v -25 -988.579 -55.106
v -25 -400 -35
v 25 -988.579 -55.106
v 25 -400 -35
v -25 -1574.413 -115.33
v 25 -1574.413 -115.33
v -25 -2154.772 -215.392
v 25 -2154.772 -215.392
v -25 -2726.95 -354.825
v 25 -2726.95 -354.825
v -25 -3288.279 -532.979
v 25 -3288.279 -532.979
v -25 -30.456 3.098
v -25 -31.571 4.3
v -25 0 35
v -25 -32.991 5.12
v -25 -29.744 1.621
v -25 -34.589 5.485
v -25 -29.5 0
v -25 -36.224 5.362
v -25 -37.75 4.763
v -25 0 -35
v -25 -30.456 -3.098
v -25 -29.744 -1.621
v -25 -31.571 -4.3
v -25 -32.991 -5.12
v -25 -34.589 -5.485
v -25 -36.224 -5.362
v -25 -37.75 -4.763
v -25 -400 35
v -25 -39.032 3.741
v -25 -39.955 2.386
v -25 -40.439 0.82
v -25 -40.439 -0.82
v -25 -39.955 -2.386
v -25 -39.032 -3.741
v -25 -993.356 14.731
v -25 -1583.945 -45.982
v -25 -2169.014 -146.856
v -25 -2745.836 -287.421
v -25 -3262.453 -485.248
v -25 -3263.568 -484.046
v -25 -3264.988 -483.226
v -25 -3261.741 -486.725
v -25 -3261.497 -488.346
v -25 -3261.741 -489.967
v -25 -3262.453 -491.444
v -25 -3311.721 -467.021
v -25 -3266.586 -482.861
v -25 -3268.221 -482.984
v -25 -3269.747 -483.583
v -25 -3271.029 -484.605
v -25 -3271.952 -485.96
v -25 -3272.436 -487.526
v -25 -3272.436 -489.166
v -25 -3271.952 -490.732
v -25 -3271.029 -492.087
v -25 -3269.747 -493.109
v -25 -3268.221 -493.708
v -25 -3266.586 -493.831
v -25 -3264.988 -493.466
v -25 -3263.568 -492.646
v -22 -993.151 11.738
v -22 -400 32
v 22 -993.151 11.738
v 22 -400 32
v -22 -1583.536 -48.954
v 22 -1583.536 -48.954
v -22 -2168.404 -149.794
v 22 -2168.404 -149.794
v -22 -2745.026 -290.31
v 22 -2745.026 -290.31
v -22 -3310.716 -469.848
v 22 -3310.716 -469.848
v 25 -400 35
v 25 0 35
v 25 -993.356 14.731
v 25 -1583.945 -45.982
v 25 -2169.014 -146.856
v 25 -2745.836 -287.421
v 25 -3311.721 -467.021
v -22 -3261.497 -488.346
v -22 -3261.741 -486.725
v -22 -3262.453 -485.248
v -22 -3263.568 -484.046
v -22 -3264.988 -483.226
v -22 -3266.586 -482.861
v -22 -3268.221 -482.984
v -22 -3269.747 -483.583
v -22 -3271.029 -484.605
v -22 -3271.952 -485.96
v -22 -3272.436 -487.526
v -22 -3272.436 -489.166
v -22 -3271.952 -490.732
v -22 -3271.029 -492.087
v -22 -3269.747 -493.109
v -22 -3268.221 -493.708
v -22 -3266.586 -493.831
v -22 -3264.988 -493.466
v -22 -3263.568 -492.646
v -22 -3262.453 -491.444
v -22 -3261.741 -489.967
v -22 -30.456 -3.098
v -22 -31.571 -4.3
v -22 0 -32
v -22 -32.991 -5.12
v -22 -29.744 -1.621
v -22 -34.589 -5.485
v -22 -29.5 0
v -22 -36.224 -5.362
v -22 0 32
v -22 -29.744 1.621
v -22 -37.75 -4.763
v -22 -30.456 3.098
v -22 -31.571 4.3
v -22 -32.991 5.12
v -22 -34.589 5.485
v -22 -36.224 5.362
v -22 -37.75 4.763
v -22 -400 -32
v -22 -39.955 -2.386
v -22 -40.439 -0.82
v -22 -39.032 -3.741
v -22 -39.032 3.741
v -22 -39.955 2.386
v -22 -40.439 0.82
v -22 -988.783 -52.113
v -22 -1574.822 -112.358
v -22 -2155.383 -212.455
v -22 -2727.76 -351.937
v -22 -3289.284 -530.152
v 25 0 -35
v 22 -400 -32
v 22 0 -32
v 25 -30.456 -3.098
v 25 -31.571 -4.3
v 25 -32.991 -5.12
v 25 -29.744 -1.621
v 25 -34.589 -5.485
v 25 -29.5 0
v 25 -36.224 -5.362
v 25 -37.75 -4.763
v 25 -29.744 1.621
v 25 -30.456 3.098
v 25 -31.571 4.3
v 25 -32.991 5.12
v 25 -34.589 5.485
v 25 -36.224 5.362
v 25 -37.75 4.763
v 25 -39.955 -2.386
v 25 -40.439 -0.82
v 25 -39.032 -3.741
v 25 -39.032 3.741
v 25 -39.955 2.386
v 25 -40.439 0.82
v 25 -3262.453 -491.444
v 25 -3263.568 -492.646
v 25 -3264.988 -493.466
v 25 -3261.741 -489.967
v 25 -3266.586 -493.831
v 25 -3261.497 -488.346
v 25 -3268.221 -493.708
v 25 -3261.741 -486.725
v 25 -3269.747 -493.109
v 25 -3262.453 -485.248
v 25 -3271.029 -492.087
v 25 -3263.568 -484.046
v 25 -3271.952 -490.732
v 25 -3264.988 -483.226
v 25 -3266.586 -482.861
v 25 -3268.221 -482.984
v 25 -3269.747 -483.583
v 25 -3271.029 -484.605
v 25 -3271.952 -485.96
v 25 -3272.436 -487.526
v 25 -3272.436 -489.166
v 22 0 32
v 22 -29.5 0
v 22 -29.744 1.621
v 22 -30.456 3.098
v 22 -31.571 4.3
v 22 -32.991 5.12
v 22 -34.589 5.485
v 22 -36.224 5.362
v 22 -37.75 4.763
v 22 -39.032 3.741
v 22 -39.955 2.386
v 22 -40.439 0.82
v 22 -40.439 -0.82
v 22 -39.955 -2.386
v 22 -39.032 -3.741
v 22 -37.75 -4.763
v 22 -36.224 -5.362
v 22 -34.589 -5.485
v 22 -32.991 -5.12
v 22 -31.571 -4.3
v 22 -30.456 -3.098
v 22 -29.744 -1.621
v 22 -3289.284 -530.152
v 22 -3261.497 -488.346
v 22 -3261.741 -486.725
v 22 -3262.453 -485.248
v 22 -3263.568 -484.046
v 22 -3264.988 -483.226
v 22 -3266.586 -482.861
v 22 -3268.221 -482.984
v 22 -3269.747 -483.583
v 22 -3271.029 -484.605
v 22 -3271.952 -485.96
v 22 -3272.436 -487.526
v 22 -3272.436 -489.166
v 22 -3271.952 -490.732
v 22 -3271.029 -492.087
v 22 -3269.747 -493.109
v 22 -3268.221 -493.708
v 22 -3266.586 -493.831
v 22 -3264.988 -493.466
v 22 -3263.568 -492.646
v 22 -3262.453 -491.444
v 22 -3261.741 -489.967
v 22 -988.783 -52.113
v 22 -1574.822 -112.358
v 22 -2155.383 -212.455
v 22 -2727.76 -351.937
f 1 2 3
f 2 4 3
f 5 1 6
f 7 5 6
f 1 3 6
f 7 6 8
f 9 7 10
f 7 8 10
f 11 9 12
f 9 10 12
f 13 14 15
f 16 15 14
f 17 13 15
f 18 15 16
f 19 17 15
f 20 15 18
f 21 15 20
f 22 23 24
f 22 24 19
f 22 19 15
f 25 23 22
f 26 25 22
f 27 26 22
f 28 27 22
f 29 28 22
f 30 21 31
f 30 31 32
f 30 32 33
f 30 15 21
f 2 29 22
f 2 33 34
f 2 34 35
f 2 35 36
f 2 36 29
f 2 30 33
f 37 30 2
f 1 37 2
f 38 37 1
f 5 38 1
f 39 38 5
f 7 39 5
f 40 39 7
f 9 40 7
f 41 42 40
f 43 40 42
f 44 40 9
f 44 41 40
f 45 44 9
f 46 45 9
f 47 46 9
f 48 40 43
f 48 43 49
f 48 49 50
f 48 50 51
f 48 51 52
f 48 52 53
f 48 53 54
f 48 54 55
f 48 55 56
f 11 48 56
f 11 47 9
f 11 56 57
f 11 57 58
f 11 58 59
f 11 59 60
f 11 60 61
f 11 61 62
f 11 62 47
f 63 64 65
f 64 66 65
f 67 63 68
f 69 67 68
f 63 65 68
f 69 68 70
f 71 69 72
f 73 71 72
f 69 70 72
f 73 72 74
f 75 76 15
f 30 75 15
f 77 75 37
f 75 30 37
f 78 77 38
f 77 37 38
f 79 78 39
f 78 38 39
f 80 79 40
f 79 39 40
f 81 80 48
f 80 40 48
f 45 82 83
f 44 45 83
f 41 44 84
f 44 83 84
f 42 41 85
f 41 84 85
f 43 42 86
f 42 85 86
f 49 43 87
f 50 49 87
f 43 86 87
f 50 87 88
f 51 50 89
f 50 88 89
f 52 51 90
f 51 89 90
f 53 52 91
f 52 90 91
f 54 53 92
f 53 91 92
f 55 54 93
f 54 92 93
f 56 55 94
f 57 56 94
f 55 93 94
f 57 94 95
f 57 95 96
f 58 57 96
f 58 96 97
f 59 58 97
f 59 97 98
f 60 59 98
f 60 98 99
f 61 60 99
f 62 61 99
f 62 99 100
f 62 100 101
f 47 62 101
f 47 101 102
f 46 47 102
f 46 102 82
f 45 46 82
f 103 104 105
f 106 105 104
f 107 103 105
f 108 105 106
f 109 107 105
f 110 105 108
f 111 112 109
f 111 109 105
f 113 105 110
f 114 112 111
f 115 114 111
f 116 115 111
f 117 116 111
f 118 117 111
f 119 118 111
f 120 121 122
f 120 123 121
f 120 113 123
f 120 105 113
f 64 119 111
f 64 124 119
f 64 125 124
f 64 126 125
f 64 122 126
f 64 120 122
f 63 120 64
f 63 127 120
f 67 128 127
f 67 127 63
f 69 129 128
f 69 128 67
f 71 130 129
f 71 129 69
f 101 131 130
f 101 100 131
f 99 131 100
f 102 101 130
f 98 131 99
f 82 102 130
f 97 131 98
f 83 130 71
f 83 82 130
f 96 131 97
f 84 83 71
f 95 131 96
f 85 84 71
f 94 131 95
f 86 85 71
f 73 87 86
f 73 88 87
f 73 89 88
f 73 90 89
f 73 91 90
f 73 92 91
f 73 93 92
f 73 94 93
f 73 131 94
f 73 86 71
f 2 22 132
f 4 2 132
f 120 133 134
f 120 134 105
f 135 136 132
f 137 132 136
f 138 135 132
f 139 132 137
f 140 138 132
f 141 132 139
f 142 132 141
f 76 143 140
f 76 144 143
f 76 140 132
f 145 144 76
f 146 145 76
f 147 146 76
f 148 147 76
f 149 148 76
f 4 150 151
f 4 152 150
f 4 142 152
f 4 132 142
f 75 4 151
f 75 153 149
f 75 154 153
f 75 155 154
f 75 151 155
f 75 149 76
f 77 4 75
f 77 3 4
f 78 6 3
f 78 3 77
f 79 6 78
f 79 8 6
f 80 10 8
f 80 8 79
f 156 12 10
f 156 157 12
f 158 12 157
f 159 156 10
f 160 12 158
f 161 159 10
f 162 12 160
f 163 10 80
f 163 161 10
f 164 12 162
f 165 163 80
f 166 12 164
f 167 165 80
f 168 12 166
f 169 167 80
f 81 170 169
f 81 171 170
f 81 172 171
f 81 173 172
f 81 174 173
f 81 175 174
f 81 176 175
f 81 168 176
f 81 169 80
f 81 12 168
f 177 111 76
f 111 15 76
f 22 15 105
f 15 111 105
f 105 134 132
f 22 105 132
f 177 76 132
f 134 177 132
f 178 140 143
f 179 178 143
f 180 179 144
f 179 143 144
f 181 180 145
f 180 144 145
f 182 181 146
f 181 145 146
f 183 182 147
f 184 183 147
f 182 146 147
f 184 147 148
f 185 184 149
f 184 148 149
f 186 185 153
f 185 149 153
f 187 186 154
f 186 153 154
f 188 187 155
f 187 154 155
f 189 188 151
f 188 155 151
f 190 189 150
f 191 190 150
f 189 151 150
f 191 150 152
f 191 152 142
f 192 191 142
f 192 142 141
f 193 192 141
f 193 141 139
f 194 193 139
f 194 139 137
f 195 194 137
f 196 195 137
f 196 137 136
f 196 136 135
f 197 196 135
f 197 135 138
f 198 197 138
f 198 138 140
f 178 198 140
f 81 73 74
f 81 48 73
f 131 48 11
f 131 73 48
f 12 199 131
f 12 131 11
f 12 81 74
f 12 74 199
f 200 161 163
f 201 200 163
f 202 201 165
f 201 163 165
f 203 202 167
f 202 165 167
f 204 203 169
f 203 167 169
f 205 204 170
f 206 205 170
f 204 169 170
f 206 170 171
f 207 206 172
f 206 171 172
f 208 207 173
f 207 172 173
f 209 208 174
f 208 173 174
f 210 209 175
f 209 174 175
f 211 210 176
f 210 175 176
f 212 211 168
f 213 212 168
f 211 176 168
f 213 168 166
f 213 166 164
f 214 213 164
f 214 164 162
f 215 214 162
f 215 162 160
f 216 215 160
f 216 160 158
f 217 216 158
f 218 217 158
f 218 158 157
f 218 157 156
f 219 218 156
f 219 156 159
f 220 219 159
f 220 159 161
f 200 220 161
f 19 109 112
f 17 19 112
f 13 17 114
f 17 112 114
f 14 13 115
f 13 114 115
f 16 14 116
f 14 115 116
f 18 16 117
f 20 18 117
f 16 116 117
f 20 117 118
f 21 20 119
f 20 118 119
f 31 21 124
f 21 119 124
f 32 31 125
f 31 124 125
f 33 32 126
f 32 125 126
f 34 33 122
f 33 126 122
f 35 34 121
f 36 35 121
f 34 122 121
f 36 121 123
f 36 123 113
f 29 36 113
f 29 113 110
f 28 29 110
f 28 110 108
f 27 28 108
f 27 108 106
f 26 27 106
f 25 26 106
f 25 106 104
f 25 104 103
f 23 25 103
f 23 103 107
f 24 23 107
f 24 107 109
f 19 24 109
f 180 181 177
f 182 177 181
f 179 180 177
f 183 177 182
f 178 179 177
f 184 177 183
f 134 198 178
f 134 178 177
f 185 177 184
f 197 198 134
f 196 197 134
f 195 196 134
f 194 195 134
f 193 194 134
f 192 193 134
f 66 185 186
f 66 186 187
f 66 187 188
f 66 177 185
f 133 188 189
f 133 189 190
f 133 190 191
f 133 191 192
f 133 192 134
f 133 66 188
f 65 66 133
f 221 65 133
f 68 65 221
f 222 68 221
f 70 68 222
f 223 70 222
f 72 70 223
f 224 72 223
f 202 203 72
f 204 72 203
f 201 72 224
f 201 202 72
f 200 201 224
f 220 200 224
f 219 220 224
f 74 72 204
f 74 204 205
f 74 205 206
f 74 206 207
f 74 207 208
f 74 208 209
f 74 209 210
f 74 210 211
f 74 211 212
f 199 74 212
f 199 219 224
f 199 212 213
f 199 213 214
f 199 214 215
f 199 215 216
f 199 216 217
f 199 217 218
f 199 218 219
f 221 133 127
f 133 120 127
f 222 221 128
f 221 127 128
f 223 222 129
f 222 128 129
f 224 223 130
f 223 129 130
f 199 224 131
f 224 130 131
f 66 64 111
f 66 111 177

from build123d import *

# Parameters (mm, degrees)
F0_W   = 50
F0_H   = 70
F0_W_2 = 44
F0_H_2 = 64
F4_D   = 11
F5_D   = 11


with BuildPart() as f2:
    # F2: sweep along a path in F1
    with BuildLine(Plane.YZ) as f2_path:
        Line((0, 0), (-400, 0))
        ThreePointArc((-400, 0), (-1871.3938969562, -125.915397654), (-3300, -500))
    # F0 (on Front) → F2 (sweep)
    with BuildSketch(Plane.XZ):
        Rectangle(F0_W, F0_H)
        Rectangle(F0_W_2, F0_H_2, mode=Mode.SUBTRACT)
    sweep(path=f2_path.line)

    # F4 (through all)
    with Locations(Plane(origin=(-25, 0, 0), x_dir=(0, -1, 0), z_dir=(-1, 0, 0))):
        with Locations((3266.9971003998, -488.3460899095)):
            Hole(F4_D / 2)

    # F5 (through all)
    with Locations(Plane(origin=(-25, 0, 0), x_dir=(0, -1, 0), z_dir=(-1, 0, 0))):
        with Locations((35, 0)):
            Hole(F5_D / 2)


solid = f2.part
